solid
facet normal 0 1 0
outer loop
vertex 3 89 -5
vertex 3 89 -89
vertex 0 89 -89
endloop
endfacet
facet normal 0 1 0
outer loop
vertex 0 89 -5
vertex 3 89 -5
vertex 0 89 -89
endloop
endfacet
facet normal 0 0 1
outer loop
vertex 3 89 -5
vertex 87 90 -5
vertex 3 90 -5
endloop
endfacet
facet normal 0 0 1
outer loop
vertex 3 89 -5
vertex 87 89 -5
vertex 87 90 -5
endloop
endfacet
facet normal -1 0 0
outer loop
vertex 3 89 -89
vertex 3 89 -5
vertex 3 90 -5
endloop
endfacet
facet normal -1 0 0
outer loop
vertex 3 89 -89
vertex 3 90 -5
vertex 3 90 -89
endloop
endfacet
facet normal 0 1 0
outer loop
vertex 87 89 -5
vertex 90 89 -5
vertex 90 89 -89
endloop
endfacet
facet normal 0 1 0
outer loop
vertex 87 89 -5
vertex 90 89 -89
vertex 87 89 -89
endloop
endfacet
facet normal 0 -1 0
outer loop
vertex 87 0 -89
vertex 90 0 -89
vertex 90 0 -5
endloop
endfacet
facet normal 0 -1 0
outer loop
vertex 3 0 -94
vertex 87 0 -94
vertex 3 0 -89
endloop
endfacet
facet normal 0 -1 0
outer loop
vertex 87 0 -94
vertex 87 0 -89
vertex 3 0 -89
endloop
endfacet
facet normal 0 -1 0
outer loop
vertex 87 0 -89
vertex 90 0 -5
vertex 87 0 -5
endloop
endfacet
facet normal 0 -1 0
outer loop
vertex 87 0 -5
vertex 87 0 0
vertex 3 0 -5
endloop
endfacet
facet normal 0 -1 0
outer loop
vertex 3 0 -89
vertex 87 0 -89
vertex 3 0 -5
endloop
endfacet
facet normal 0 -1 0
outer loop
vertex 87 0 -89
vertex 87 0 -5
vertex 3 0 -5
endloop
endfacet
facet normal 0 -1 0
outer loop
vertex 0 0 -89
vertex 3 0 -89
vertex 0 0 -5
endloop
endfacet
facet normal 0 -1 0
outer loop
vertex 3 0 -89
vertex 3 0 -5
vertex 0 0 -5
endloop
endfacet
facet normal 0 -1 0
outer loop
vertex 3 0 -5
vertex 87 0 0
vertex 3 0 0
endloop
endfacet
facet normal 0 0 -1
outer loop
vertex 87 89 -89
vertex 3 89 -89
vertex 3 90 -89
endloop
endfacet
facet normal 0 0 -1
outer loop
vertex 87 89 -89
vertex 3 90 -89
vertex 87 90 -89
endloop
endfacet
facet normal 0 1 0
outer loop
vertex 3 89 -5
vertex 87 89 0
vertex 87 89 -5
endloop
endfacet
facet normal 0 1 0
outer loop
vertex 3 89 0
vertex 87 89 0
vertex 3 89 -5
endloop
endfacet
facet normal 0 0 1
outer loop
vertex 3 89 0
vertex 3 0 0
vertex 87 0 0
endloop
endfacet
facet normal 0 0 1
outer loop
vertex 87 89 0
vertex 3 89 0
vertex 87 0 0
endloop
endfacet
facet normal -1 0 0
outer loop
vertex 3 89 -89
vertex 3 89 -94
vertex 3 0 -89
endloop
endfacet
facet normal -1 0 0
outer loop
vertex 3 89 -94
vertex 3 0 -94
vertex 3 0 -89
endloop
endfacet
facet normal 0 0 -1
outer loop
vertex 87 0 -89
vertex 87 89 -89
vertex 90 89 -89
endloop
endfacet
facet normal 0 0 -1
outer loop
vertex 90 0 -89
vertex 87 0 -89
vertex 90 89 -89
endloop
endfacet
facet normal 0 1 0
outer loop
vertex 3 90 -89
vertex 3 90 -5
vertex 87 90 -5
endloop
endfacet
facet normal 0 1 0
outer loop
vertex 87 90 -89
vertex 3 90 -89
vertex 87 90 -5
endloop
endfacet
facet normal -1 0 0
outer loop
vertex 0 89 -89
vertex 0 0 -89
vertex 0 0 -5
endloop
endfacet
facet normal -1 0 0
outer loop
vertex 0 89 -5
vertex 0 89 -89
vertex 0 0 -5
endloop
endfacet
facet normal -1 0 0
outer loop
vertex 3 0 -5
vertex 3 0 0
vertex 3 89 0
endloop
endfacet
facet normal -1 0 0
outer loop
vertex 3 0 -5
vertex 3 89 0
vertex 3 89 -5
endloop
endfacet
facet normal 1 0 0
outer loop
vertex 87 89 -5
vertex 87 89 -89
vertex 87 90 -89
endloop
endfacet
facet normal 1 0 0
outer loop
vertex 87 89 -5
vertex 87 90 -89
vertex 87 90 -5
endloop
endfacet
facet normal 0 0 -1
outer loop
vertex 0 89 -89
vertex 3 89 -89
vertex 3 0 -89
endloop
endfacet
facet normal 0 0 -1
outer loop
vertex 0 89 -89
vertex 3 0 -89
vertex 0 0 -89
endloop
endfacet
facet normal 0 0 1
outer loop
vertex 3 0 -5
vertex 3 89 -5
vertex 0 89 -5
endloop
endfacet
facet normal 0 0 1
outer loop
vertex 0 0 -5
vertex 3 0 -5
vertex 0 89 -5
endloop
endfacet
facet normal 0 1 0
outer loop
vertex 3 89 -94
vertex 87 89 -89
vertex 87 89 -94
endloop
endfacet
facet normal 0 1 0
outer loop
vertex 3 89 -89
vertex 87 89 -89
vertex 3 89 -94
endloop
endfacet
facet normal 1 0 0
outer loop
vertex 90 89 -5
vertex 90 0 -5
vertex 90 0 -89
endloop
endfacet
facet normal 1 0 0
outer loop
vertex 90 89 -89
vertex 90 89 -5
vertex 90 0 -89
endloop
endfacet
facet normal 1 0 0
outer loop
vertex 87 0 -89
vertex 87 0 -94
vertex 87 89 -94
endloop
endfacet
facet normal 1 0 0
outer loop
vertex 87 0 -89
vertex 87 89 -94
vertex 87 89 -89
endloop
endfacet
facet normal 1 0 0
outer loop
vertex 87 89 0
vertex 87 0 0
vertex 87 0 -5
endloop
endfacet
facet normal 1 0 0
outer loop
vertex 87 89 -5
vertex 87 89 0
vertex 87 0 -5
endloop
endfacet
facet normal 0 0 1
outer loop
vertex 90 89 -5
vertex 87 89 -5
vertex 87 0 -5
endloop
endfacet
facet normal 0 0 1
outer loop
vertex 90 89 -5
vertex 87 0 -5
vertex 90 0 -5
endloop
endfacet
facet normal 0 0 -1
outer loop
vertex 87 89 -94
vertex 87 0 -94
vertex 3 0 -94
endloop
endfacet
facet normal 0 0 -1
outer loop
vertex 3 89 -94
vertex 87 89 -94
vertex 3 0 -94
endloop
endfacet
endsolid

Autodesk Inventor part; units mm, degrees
ref_plane "YZ Plane" through (0, 0, 0) normal (1, 0, 0) x (0, 1, 0)
ref_plane "XZ Plane" through (0, 0, 0) normal (0, 1, 0) x (-1, 0, 0)
ref_plane "XY Plane" through (0, 0, 0) normal (0, 0, 1) x (1, 0, 0)
sketch "Sketch1" plane through (0, 0, 0) normal (0, 1, 0) x (-1, 0, 0)
  line L0 (0, 0) -> (-90, 0)
  line L1 (-90, 0) -> (-90, -94)
  line L2 (-90, -94) -> (0, -94)
  line L3 (0, -94) -> (0, 0)
  line L4 (0, -94) -> (-3, -94)
  line L5 (-3, -94) -> (-3, -89)
  line L6 (-3, -89) -> (0, -89)
  line L7 (0, -89) -> (0, -94)
  line L8 (-90, -94) -> (-87, -94)
  line L9 (-87, -94) -> (-87, -89)
  line L10 (-87, -89) -> (-90, -89)
  line L11 (-90, -89) -> (-90, -94)
  line L12 (0, 0) -> (-3, 0)
  line L13 (-3, 0) -> (-3, -5)
  line L14 (-3, -5) -> (0, -5)
  line L15 (0, -5) -> (0, 0)
  line L16 (-90, 0) -> (-87, 0)
  line L17 (-87, 0) -> (-87, -5)
  line L18 (-87, -5) -> (-90, -5)
  line L19 (-90, -5) -> (-90, 0)
  dimension "d0" = 94
  dimension "d1" = 90
  dimension "d2" = 5
  dimension "d3" = 3
extrude "Extrusion1" add sketch "Sketch1" along normal blind 89 contours L13 L14 L3 L6 L5 L2 L9 L10 L1 L18 L17 L0
sketch "Sketch3" plane through (0, 89, 0) normal (0, 1, 0) x (1, 0, 0)
  line L0 (3, 94) -> (3, 89) projected
  line L1 (87, 5) -> (3, 5)
  line L2 (3, 5) -> (3, 89)
  line L3 (3, 89) -> (87, 89)
  line L4 (87, 89) -> (87, 5)
  point P0 (0, 0)
extrude "Extrusion2" add sketch "Sketch3" along normal blind 1
properties part number "Payload"
